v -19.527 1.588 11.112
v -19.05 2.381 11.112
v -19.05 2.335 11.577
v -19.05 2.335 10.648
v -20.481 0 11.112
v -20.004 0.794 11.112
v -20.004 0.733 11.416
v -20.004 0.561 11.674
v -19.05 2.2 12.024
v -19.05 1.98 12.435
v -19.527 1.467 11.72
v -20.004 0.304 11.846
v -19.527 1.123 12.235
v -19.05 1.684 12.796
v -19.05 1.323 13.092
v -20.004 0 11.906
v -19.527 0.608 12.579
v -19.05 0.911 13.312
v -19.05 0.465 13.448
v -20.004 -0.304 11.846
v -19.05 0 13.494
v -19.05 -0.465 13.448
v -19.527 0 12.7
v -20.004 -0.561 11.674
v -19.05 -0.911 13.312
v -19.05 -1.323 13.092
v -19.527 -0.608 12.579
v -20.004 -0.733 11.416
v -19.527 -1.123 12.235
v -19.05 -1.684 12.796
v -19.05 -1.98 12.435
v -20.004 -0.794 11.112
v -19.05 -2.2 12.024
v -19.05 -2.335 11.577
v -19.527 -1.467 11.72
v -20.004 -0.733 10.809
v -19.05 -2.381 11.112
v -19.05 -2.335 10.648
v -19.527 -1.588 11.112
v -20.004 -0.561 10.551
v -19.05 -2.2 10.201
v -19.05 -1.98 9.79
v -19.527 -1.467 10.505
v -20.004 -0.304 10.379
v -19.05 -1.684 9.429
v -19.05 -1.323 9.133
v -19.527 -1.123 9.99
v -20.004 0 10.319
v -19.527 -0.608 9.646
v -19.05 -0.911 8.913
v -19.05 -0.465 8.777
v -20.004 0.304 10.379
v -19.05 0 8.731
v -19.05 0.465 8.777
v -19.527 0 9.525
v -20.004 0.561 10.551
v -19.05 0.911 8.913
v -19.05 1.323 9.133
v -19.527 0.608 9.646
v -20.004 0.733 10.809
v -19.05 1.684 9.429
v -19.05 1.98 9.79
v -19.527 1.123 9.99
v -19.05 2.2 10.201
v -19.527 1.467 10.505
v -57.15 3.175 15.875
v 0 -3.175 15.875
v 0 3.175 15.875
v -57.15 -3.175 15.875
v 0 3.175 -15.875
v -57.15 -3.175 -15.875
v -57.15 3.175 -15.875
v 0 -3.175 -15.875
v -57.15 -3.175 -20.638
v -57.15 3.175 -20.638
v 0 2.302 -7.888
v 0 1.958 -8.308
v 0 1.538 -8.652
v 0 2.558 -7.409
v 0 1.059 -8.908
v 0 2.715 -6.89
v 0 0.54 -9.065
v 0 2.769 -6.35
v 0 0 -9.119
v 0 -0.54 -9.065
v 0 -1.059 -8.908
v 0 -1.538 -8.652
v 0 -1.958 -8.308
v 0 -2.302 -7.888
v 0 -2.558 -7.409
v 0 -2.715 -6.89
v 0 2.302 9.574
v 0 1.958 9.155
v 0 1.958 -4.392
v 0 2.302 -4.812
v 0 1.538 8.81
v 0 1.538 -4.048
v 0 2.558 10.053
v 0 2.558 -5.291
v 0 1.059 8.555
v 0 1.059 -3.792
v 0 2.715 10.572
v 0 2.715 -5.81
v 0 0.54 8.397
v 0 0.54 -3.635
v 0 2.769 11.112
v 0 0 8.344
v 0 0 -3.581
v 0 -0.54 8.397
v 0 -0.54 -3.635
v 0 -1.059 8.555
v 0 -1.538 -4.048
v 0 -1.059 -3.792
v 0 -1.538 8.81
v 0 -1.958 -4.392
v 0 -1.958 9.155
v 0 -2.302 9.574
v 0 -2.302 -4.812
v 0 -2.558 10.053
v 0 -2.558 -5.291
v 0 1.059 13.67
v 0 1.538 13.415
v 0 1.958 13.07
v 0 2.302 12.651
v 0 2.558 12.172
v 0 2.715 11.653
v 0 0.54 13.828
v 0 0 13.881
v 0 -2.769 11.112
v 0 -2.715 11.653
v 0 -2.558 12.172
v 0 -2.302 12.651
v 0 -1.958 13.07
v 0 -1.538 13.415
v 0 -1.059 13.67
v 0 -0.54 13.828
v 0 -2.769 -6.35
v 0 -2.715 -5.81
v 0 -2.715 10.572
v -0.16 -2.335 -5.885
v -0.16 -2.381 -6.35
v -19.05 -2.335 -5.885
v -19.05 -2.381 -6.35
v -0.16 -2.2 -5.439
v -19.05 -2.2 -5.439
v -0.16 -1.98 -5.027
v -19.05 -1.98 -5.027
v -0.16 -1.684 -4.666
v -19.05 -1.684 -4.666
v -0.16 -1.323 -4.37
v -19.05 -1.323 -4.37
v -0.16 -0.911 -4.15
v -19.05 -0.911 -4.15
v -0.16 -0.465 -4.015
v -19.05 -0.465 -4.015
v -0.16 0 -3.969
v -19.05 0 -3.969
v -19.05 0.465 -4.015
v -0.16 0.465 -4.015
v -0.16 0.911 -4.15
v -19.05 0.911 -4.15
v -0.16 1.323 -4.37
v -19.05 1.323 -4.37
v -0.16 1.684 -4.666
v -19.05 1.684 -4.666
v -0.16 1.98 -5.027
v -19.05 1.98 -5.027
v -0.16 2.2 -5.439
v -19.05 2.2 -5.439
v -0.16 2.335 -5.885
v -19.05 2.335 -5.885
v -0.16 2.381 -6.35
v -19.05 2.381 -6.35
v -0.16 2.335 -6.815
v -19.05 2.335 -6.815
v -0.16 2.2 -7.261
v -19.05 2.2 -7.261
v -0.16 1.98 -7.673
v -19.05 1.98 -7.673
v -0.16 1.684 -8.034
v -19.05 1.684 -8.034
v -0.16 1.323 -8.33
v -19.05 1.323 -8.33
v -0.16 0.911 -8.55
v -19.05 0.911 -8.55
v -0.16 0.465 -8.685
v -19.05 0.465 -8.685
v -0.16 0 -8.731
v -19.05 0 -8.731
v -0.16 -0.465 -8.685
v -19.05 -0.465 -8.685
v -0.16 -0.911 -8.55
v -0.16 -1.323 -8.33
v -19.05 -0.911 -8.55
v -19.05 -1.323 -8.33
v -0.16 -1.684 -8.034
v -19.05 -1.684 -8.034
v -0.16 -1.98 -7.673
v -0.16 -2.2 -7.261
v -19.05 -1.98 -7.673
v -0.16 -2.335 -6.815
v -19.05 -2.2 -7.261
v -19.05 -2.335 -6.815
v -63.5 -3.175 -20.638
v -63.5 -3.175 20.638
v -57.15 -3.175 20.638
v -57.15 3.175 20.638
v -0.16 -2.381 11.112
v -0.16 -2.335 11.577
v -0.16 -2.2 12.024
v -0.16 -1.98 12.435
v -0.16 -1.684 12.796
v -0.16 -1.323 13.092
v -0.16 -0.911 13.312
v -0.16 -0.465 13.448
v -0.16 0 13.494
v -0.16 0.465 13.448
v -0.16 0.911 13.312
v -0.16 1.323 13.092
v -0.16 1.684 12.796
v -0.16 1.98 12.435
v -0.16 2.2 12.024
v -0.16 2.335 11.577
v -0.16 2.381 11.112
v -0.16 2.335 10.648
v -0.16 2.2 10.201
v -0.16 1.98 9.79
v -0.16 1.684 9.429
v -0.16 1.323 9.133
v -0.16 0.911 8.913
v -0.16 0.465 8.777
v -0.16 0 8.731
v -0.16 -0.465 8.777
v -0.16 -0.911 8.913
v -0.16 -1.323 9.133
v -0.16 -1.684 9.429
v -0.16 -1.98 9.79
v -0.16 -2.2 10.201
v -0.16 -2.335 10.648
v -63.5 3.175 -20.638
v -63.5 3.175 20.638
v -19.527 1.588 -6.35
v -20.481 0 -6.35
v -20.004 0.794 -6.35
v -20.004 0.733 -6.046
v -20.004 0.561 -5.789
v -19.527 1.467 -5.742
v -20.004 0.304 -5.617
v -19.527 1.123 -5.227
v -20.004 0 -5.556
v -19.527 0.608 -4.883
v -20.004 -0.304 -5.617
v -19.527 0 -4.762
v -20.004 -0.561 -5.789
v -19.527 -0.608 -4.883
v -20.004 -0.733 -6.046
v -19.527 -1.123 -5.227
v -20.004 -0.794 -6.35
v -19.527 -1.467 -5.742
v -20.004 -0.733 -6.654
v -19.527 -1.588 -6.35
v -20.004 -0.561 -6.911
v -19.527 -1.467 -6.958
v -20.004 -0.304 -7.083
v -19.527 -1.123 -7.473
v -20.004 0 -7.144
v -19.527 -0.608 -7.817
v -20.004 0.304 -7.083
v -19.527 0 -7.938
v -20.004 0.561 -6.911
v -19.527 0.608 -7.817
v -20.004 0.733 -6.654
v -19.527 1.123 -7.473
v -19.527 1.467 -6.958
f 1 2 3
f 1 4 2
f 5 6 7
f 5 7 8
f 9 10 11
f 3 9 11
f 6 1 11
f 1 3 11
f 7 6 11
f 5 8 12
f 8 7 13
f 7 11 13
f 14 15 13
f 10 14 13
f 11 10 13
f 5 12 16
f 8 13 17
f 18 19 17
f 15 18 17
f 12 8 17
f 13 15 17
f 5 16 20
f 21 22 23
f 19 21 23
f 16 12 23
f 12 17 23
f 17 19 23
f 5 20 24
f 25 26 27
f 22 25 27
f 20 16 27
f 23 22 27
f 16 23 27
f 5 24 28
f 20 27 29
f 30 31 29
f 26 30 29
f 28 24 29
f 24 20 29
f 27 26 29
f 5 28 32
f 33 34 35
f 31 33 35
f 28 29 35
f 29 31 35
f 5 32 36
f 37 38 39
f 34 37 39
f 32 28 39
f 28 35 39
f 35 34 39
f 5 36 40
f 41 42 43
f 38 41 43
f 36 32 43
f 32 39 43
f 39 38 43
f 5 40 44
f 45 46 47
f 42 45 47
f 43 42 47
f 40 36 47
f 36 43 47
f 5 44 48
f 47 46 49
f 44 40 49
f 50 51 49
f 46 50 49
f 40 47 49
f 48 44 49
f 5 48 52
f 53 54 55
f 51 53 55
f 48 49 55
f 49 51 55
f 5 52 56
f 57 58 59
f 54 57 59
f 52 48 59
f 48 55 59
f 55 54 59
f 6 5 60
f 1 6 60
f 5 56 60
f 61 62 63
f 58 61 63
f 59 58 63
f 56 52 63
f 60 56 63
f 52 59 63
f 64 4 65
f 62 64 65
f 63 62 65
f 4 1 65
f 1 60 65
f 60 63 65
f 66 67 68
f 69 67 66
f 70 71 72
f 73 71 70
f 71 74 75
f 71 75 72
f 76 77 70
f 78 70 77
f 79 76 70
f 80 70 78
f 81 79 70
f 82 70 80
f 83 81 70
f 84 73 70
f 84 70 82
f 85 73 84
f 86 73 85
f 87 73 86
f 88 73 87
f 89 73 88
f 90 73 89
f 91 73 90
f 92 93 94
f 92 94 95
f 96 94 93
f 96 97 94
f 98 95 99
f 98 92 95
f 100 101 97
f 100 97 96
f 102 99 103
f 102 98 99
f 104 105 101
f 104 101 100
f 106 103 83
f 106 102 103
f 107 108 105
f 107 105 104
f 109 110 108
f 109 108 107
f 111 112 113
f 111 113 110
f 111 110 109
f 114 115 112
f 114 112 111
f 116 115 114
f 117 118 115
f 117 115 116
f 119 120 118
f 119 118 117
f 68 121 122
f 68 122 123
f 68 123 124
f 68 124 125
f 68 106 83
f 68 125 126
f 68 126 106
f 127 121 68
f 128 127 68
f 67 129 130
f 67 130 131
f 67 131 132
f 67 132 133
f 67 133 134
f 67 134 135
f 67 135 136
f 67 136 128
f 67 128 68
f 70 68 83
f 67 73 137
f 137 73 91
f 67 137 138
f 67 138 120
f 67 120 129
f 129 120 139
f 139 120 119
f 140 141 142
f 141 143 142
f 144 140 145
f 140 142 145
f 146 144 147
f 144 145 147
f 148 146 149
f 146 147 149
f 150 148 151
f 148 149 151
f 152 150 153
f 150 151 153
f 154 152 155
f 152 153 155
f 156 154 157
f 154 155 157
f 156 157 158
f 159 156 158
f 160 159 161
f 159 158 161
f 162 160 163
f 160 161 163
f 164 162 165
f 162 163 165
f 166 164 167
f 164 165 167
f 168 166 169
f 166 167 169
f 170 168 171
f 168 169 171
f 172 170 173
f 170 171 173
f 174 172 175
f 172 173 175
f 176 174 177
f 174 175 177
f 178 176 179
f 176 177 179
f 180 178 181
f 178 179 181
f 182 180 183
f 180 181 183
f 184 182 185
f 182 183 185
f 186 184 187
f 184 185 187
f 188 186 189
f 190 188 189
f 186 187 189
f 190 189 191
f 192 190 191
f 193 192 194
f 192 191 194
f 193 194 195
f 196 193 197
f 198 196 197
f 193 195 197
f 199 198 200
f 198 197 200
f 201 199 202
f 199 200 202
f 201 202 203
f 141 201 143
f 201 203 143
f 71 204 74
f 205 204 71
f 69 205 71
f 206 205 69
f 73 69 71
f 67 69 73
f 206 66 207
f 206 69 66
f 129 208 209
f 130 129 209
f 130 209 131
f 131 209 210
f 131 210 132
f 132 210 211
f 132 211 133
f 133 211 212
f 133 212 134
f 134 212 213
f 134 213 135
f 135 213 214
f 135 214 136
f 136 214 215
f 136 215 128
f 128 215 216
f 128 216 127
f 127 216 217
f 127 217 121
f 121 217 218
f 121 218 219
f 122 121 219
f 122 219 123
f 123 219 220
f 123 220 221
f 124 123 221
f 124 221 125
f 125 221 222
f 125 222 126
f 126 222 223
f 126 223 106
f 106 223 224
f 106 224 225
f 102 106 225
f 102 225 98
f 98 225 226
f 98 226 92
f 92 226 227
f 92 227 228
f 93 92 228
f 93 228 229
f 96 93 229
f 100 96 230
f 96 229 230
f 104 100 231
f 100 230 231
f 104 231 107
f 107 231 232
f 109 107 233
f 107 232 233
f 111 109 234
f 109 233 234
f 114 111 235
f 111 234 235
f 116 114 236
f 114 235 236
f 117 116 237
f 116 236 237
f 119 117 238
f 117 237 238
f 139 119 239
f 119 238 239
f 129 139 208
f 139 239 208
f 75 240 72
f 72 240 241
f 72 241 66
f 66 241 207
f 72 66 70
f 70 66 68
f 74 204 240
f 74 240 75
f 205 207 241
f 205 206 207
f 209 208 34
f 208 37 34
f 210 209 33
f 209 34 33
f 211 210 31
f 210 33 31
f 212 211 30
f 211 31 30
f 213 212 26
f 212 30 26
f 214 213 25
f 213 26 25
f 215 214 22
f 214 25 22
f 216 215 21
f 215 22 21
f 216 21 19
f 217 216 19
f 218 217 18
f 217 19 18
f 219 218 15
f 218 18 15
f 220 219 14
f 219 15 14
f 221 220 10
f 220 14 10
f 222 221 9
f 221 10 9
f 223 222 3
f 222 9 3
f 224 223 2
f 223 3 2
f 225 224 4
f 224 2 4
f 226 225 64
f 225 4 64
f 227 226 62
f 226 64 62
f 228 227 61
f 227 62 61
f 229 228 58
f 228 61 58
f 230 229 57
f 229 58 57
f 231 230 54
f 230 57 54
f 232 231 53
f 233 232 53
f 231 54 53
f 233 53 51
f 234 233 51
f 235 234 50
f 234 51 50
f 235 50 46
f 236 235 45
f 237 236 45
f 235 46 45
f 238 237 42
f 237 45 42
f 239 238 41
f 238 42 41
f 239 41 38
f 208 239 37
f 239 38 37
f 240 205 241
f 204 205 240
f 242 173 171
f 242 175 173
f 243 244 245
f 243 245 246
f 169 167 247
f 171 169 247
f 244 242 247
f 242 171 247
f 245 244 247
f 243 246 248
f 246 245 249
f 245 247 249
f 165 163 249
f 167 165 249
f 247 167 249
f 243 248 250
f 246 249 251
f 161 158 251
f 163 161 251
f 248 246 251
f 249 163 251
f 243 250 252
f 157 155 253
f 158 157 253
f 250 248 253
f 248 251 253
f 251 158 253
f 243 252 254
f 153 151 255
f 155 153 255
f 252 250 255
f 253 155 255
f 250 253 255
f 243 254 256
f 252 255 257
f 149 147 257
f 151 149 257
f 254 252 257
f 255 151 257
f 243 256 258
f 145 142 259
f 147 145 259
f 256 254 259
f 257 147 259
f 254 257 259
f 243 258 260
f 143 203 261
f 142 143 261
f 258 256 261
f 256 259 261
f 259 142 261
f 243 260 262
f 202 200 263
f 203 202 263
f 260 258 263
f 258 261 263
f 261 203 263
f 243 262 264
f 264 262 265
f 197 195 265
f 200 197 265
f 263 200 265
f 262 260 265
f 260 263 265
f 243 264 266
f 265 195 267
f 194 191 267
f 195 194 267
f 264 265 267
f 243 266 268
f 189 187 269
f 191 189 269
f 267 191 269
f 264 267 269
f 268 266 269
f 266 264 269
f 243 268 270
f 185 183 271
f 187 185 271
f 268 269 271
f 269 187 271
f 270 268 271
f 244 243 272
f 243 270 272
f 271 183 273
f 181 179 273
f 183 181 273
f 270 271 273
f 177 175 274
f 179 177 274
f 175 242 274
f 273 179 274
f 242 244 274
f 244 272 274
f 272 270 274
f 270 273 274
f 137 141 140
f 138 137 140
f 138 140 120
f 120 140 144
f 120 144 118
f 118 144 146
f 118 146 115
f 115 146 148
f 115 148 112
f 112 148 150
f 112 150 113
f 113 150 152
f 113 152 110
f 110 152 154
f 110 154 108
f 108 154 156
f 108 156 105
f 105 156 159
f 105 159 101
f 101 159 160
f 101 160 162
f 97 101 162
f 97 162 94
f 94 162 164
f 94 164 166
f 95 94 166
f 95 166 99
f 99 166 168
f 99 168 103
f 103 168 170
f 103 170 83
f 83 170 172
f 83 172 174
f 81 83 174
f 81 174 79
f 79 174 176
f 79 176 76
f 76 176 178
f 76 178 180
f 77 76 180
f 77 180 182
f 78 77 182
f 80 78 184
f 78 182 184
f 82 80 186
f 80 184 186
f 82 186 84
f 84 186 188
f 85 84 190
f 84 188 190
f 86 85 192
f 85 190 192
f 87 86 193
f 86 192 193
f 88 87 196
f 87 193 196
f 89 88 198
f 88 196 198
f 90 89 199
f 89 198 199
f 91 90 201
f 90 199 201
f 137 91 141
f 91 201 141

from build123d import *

# Parameters (mm, degrees)
F1_DEPTH       = 3.175
F3_D           = 4.7625
F3_DEPTH       = 19.05
F3_CSINK_D     = 5.5372
F3_CSINK_ANGLE = 135
F3_TIP         = 1.4307993491


with BuildPart() as f1:
    # F0 (on Front) → F1 (new body, symmetric)
    with BuildSketch(Plane.XZ):
        Polygon((-57.15, 20.6375), (-63.5, 20.6375), (-63.5, -20.6375), (-57.15, -20.6375), (-57.15, -15.875), (0, -15.875), (0, 15.875), (-57.15, 15.875), align=None)
    extrude(amount=F1_DEPTH, both=True)

    # F3
    with Locations(Plane.YZ):
        with Locations((0, 11.1125), (0, -6.35)):
            CounterSinkHole(F3_D / 2, F3_CSINK_D / 2, depth=F3_DEPTH, counter_sink_angle=F3_CSINK_ANGLE)
            with Locations((0, 0, -(F3_DEPTH + F3_TIP / 2))):  # 118° drill point
                Cone(0, F3_D / 2, F3_TIP, mode=Mode.SUBTRACT)


solid = f1.part
